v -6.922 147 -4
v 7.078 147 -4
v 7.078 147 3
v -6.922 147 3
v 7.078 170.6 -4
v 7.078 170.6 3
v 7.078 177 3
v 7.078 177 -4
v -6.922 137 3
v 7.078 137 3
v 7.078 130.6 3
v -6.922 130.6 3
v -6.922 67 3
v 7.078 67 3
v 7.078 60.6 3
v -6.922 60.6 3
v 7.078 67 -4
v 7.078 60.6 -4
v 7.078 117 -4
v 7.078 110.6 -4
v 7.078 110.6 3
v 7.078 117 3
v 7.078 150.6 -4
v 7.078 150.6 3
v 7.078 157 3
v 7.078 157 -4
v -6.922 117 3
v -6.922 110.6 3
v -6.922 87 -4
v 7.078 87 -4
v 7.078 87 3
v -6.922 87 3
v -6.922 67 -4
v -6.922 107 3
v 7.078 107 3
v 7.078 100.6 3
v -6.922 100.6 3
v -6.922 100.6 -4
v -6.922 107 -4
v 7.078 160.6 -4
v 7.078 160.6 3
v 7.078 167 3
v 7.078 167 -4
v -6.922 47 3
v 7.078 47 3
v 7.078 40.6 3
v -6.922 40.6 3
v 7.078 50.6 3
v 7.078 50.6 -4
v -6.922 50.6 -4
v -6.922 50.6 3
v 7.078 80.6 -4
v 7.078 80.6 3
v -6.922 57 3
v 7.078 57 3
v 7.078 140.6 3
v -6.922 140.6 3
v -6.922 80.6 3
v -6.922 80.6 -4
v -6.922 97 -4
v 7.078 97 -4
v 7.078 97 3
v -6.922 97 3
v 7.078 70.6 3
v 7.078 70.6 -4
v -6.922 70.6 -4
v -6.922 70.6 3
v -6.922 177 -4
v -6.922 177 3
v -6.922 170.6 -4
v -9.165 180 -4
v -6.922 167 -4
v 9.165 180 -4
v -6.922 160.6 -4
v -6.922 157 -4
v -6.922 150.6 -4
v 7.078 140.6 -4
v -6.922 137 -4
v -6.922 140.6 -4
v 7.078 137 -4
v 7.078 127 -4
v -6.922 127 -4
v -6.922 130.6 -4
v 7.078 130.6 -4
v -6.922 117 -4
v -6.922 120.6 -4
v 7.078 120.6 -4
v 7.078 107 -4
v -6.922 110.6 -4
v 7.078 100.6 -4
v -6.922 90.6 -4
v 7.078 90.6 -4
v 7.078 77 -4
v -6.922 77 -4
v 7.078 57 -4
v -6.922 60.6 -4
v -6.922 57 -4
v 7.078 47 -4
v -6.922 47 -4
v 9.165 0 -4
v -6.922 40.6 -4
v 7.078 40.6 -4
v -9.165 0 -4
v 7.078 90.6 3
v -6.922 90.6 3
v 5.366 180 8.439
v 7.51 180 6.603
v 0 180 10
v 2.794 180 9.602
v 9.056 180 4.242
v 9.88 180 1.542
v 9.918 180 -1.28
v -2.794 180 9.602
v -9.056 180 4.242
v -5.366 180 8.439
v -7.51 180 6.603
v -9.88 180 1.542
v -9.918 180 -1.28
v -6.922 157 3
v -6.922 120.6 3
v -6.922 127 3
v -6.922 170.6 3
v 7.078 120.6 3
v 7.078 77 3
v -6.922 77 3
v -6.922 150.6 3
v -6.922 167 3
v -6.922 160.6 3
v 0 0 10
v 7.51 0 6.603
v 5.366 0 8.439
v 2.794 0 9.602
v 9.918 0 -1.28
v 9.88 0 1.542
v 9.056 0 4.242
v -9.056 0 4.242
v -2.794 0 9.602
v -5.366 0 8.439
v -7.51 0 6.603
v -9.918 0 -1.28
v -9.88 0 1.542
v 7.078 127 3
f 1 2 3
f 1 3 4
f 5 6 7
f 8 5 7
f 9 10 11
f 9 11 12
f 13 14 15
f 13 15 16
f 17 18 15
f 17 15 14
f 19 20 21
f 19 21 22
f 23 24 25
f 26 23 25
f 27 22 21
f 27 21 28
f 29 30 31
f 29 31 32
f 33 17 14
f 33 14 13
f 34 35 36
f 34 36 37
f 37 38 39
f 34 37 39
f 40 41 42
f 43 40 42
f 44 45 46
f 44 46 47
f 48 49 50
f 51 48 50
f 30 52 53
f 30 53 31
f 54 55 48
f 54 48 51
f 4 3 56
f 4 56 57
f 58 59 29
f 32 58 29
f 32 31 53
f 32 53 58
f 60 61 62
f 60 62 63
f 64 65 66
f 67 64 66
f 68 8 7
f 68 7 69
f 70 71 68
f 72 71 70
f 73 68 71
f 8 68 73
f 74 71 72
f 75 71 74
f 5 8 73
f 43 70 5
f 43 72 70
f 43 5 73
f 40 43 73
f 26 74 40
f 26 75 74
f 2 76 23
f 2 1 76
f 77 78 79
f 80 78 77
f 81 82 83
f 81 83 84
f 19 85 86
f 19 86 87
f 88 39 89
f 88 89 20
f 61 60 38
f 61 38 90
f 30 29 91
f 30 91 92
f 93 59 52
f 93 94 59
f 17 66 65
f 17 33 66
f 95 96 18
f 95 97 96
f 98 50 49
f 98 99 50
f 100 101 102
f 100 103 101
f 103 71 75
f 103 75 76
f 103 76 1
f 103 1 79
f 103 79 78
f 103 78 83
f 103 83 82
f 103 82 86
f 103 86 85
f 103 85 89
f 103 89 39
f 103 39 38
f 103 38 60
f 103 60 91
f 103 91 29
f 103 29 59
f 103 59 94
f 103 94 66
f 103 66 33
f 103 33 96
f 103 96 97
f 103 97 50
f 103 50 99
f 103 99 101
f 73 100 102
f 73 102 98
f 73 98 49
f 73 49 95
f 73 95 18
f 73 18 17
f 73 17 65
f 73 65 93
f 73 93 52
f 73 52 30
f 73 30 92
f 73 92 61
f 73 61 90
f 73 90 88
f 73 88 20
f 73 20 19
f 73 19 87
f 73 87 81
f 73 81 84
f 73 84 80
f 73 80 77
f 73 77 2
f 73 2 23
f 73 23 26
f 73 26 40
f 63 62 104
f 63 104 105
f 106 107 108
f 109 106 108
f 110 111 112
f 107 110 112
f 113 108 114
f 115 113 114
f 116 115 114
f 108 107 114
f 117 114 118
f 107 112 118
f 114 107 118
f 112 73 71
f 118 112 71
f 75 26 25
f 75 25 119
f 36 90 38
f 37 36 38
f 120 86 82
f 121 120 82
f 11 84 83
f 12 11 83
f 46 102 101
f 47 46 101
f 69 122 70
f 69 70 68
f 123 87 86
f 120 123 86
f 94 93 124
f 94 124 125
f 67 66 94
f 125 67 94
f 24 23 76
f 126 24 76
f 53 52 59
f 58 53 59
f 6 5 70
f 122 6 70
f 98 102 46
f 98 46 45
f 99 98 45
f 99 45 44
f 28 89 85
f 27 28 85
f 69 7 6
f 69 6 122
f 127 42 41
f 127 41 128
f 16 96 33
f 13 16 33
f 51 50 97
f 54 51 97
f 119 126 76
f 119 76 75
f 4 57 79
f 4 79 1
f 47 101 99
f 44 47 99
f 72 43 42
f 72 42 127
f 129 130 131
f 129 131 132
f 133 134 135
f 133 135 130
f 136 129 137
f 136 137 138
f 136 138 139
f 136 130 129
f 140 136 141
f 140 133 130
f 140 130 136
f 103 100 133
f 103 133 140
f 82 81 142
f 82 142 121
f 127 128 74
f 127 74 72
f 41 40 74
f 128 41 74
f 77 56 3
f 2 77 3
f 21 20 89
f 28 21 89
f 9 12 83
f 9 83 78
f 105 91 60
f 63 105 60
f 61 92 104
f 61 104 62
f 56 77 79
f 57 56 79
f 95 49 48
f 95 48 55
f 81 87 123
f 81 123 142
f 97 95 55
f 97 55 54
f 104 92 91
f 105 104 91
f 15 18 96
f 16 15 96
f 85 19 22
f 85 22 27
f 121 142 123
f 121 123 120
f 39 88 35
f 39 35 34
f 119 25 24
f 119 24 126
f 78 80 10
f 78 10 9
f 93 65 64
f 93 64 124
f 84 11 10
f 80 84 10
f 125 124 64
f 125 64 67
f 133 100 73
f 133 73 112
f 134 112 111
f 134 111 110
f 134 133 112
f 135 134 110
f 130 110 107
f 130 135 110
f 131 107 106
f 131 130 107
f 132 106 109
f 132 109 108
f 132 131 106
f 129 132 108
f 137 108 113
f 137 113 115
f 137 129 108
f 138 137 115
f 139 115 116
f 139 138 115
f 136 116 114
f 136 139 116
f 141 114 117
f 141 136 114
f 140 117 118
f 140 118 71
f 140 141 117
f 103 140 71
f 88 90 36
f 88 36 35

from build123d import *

# Parameters (mm, degrees)
BOSS_EXTRUDE1_DEPTH = 180
SKETCH3_W           = 14
SKETCH3_H           = 6.4
CUT_EXTRUDE1_DEPTH  = 7


with BuildPart() as part:
    # Sketch2 → Boss-Extrude1 (new body)
    with BuildSketch(Plane(origin=(0, 0, 0), x_dir=(1, 0, 0), z_dir=(0, 1, 0))):
        with BuildLine():
            Line((-9.16515139, 4), (9.16515139, 4))
            ThreePointArc((9.16515139, 4), (0, -10), (-9.16515139, 4))
        make_face()
    extrude(amount=BOSS_EXTRUDE1_DEPTH)

    # Sketch3 → Cut-Extrude1 (cut)
    with BuildSketch(Plane(origin=(0, 0, -4), x_dir=(-1, 0, 0), z_dir=(0, 0, -1))):
        with Locations((-0.07756818, 173.8)):
            Rectangle(SKETCH3_W, SKETCH3_H)
        with Locations((-0.07756818, 163.8)):
            Rectangle(SKETCH3_W, SKETCH3_H)
        with Locations((-0.07756818, 153.8)):
            Rectangle(SKETCH3_W, SKETCH3_H)
        with Locations((-0.07756818, 143.8)):
            Rectangle(SKETCH3_W, SKETCH3_H)
        with Locations((-0.07756818, 133.8)):
            Rectangle(SKETCH3_W, SKETCH3_H)
        with Locations((-0.07756818, 123.8)):
            Rectangle(SKETCH3_W, SKETCH3_H)
        with Locations((-0.07756818, 113.8)):
            Rectangle(SKETCH3_W, SKETCH3_H)
        with Locations((-0.07756818, 103.8)):
            Rectangle(SKETCH3_W, SKETCH3_H)
        with Locations((-0.07756818, 93.8)):
            Rectangle(SKETCH3_W, SKETCH3_H)
        with Locations((-0.07756818, 83.8)):
            Rectangle(SKETCH3_W, SKETCH3_H)
        with Locations((-0.07756818, 73.8)):
            Rectangle(SKETCH3_W, SKETCH3_H)
        with Locations((-0.07756818, 63.8)):
            Rectangle(SKETCH3_W, SKETCH3_H)
        with Locations((-0.07756818, 53.8)):
            Rectangle(SKETCH3_W, SKETCH3_H)
        with Locations((-0.07756818, 43.8)):
            Rectangle(SKETCH3_W, SKETCH3_H)
    extrude(amount=-CUT_EXTRUDE1_DEPTH, mode=Mode.SUBTRACT)


solid = part.part
